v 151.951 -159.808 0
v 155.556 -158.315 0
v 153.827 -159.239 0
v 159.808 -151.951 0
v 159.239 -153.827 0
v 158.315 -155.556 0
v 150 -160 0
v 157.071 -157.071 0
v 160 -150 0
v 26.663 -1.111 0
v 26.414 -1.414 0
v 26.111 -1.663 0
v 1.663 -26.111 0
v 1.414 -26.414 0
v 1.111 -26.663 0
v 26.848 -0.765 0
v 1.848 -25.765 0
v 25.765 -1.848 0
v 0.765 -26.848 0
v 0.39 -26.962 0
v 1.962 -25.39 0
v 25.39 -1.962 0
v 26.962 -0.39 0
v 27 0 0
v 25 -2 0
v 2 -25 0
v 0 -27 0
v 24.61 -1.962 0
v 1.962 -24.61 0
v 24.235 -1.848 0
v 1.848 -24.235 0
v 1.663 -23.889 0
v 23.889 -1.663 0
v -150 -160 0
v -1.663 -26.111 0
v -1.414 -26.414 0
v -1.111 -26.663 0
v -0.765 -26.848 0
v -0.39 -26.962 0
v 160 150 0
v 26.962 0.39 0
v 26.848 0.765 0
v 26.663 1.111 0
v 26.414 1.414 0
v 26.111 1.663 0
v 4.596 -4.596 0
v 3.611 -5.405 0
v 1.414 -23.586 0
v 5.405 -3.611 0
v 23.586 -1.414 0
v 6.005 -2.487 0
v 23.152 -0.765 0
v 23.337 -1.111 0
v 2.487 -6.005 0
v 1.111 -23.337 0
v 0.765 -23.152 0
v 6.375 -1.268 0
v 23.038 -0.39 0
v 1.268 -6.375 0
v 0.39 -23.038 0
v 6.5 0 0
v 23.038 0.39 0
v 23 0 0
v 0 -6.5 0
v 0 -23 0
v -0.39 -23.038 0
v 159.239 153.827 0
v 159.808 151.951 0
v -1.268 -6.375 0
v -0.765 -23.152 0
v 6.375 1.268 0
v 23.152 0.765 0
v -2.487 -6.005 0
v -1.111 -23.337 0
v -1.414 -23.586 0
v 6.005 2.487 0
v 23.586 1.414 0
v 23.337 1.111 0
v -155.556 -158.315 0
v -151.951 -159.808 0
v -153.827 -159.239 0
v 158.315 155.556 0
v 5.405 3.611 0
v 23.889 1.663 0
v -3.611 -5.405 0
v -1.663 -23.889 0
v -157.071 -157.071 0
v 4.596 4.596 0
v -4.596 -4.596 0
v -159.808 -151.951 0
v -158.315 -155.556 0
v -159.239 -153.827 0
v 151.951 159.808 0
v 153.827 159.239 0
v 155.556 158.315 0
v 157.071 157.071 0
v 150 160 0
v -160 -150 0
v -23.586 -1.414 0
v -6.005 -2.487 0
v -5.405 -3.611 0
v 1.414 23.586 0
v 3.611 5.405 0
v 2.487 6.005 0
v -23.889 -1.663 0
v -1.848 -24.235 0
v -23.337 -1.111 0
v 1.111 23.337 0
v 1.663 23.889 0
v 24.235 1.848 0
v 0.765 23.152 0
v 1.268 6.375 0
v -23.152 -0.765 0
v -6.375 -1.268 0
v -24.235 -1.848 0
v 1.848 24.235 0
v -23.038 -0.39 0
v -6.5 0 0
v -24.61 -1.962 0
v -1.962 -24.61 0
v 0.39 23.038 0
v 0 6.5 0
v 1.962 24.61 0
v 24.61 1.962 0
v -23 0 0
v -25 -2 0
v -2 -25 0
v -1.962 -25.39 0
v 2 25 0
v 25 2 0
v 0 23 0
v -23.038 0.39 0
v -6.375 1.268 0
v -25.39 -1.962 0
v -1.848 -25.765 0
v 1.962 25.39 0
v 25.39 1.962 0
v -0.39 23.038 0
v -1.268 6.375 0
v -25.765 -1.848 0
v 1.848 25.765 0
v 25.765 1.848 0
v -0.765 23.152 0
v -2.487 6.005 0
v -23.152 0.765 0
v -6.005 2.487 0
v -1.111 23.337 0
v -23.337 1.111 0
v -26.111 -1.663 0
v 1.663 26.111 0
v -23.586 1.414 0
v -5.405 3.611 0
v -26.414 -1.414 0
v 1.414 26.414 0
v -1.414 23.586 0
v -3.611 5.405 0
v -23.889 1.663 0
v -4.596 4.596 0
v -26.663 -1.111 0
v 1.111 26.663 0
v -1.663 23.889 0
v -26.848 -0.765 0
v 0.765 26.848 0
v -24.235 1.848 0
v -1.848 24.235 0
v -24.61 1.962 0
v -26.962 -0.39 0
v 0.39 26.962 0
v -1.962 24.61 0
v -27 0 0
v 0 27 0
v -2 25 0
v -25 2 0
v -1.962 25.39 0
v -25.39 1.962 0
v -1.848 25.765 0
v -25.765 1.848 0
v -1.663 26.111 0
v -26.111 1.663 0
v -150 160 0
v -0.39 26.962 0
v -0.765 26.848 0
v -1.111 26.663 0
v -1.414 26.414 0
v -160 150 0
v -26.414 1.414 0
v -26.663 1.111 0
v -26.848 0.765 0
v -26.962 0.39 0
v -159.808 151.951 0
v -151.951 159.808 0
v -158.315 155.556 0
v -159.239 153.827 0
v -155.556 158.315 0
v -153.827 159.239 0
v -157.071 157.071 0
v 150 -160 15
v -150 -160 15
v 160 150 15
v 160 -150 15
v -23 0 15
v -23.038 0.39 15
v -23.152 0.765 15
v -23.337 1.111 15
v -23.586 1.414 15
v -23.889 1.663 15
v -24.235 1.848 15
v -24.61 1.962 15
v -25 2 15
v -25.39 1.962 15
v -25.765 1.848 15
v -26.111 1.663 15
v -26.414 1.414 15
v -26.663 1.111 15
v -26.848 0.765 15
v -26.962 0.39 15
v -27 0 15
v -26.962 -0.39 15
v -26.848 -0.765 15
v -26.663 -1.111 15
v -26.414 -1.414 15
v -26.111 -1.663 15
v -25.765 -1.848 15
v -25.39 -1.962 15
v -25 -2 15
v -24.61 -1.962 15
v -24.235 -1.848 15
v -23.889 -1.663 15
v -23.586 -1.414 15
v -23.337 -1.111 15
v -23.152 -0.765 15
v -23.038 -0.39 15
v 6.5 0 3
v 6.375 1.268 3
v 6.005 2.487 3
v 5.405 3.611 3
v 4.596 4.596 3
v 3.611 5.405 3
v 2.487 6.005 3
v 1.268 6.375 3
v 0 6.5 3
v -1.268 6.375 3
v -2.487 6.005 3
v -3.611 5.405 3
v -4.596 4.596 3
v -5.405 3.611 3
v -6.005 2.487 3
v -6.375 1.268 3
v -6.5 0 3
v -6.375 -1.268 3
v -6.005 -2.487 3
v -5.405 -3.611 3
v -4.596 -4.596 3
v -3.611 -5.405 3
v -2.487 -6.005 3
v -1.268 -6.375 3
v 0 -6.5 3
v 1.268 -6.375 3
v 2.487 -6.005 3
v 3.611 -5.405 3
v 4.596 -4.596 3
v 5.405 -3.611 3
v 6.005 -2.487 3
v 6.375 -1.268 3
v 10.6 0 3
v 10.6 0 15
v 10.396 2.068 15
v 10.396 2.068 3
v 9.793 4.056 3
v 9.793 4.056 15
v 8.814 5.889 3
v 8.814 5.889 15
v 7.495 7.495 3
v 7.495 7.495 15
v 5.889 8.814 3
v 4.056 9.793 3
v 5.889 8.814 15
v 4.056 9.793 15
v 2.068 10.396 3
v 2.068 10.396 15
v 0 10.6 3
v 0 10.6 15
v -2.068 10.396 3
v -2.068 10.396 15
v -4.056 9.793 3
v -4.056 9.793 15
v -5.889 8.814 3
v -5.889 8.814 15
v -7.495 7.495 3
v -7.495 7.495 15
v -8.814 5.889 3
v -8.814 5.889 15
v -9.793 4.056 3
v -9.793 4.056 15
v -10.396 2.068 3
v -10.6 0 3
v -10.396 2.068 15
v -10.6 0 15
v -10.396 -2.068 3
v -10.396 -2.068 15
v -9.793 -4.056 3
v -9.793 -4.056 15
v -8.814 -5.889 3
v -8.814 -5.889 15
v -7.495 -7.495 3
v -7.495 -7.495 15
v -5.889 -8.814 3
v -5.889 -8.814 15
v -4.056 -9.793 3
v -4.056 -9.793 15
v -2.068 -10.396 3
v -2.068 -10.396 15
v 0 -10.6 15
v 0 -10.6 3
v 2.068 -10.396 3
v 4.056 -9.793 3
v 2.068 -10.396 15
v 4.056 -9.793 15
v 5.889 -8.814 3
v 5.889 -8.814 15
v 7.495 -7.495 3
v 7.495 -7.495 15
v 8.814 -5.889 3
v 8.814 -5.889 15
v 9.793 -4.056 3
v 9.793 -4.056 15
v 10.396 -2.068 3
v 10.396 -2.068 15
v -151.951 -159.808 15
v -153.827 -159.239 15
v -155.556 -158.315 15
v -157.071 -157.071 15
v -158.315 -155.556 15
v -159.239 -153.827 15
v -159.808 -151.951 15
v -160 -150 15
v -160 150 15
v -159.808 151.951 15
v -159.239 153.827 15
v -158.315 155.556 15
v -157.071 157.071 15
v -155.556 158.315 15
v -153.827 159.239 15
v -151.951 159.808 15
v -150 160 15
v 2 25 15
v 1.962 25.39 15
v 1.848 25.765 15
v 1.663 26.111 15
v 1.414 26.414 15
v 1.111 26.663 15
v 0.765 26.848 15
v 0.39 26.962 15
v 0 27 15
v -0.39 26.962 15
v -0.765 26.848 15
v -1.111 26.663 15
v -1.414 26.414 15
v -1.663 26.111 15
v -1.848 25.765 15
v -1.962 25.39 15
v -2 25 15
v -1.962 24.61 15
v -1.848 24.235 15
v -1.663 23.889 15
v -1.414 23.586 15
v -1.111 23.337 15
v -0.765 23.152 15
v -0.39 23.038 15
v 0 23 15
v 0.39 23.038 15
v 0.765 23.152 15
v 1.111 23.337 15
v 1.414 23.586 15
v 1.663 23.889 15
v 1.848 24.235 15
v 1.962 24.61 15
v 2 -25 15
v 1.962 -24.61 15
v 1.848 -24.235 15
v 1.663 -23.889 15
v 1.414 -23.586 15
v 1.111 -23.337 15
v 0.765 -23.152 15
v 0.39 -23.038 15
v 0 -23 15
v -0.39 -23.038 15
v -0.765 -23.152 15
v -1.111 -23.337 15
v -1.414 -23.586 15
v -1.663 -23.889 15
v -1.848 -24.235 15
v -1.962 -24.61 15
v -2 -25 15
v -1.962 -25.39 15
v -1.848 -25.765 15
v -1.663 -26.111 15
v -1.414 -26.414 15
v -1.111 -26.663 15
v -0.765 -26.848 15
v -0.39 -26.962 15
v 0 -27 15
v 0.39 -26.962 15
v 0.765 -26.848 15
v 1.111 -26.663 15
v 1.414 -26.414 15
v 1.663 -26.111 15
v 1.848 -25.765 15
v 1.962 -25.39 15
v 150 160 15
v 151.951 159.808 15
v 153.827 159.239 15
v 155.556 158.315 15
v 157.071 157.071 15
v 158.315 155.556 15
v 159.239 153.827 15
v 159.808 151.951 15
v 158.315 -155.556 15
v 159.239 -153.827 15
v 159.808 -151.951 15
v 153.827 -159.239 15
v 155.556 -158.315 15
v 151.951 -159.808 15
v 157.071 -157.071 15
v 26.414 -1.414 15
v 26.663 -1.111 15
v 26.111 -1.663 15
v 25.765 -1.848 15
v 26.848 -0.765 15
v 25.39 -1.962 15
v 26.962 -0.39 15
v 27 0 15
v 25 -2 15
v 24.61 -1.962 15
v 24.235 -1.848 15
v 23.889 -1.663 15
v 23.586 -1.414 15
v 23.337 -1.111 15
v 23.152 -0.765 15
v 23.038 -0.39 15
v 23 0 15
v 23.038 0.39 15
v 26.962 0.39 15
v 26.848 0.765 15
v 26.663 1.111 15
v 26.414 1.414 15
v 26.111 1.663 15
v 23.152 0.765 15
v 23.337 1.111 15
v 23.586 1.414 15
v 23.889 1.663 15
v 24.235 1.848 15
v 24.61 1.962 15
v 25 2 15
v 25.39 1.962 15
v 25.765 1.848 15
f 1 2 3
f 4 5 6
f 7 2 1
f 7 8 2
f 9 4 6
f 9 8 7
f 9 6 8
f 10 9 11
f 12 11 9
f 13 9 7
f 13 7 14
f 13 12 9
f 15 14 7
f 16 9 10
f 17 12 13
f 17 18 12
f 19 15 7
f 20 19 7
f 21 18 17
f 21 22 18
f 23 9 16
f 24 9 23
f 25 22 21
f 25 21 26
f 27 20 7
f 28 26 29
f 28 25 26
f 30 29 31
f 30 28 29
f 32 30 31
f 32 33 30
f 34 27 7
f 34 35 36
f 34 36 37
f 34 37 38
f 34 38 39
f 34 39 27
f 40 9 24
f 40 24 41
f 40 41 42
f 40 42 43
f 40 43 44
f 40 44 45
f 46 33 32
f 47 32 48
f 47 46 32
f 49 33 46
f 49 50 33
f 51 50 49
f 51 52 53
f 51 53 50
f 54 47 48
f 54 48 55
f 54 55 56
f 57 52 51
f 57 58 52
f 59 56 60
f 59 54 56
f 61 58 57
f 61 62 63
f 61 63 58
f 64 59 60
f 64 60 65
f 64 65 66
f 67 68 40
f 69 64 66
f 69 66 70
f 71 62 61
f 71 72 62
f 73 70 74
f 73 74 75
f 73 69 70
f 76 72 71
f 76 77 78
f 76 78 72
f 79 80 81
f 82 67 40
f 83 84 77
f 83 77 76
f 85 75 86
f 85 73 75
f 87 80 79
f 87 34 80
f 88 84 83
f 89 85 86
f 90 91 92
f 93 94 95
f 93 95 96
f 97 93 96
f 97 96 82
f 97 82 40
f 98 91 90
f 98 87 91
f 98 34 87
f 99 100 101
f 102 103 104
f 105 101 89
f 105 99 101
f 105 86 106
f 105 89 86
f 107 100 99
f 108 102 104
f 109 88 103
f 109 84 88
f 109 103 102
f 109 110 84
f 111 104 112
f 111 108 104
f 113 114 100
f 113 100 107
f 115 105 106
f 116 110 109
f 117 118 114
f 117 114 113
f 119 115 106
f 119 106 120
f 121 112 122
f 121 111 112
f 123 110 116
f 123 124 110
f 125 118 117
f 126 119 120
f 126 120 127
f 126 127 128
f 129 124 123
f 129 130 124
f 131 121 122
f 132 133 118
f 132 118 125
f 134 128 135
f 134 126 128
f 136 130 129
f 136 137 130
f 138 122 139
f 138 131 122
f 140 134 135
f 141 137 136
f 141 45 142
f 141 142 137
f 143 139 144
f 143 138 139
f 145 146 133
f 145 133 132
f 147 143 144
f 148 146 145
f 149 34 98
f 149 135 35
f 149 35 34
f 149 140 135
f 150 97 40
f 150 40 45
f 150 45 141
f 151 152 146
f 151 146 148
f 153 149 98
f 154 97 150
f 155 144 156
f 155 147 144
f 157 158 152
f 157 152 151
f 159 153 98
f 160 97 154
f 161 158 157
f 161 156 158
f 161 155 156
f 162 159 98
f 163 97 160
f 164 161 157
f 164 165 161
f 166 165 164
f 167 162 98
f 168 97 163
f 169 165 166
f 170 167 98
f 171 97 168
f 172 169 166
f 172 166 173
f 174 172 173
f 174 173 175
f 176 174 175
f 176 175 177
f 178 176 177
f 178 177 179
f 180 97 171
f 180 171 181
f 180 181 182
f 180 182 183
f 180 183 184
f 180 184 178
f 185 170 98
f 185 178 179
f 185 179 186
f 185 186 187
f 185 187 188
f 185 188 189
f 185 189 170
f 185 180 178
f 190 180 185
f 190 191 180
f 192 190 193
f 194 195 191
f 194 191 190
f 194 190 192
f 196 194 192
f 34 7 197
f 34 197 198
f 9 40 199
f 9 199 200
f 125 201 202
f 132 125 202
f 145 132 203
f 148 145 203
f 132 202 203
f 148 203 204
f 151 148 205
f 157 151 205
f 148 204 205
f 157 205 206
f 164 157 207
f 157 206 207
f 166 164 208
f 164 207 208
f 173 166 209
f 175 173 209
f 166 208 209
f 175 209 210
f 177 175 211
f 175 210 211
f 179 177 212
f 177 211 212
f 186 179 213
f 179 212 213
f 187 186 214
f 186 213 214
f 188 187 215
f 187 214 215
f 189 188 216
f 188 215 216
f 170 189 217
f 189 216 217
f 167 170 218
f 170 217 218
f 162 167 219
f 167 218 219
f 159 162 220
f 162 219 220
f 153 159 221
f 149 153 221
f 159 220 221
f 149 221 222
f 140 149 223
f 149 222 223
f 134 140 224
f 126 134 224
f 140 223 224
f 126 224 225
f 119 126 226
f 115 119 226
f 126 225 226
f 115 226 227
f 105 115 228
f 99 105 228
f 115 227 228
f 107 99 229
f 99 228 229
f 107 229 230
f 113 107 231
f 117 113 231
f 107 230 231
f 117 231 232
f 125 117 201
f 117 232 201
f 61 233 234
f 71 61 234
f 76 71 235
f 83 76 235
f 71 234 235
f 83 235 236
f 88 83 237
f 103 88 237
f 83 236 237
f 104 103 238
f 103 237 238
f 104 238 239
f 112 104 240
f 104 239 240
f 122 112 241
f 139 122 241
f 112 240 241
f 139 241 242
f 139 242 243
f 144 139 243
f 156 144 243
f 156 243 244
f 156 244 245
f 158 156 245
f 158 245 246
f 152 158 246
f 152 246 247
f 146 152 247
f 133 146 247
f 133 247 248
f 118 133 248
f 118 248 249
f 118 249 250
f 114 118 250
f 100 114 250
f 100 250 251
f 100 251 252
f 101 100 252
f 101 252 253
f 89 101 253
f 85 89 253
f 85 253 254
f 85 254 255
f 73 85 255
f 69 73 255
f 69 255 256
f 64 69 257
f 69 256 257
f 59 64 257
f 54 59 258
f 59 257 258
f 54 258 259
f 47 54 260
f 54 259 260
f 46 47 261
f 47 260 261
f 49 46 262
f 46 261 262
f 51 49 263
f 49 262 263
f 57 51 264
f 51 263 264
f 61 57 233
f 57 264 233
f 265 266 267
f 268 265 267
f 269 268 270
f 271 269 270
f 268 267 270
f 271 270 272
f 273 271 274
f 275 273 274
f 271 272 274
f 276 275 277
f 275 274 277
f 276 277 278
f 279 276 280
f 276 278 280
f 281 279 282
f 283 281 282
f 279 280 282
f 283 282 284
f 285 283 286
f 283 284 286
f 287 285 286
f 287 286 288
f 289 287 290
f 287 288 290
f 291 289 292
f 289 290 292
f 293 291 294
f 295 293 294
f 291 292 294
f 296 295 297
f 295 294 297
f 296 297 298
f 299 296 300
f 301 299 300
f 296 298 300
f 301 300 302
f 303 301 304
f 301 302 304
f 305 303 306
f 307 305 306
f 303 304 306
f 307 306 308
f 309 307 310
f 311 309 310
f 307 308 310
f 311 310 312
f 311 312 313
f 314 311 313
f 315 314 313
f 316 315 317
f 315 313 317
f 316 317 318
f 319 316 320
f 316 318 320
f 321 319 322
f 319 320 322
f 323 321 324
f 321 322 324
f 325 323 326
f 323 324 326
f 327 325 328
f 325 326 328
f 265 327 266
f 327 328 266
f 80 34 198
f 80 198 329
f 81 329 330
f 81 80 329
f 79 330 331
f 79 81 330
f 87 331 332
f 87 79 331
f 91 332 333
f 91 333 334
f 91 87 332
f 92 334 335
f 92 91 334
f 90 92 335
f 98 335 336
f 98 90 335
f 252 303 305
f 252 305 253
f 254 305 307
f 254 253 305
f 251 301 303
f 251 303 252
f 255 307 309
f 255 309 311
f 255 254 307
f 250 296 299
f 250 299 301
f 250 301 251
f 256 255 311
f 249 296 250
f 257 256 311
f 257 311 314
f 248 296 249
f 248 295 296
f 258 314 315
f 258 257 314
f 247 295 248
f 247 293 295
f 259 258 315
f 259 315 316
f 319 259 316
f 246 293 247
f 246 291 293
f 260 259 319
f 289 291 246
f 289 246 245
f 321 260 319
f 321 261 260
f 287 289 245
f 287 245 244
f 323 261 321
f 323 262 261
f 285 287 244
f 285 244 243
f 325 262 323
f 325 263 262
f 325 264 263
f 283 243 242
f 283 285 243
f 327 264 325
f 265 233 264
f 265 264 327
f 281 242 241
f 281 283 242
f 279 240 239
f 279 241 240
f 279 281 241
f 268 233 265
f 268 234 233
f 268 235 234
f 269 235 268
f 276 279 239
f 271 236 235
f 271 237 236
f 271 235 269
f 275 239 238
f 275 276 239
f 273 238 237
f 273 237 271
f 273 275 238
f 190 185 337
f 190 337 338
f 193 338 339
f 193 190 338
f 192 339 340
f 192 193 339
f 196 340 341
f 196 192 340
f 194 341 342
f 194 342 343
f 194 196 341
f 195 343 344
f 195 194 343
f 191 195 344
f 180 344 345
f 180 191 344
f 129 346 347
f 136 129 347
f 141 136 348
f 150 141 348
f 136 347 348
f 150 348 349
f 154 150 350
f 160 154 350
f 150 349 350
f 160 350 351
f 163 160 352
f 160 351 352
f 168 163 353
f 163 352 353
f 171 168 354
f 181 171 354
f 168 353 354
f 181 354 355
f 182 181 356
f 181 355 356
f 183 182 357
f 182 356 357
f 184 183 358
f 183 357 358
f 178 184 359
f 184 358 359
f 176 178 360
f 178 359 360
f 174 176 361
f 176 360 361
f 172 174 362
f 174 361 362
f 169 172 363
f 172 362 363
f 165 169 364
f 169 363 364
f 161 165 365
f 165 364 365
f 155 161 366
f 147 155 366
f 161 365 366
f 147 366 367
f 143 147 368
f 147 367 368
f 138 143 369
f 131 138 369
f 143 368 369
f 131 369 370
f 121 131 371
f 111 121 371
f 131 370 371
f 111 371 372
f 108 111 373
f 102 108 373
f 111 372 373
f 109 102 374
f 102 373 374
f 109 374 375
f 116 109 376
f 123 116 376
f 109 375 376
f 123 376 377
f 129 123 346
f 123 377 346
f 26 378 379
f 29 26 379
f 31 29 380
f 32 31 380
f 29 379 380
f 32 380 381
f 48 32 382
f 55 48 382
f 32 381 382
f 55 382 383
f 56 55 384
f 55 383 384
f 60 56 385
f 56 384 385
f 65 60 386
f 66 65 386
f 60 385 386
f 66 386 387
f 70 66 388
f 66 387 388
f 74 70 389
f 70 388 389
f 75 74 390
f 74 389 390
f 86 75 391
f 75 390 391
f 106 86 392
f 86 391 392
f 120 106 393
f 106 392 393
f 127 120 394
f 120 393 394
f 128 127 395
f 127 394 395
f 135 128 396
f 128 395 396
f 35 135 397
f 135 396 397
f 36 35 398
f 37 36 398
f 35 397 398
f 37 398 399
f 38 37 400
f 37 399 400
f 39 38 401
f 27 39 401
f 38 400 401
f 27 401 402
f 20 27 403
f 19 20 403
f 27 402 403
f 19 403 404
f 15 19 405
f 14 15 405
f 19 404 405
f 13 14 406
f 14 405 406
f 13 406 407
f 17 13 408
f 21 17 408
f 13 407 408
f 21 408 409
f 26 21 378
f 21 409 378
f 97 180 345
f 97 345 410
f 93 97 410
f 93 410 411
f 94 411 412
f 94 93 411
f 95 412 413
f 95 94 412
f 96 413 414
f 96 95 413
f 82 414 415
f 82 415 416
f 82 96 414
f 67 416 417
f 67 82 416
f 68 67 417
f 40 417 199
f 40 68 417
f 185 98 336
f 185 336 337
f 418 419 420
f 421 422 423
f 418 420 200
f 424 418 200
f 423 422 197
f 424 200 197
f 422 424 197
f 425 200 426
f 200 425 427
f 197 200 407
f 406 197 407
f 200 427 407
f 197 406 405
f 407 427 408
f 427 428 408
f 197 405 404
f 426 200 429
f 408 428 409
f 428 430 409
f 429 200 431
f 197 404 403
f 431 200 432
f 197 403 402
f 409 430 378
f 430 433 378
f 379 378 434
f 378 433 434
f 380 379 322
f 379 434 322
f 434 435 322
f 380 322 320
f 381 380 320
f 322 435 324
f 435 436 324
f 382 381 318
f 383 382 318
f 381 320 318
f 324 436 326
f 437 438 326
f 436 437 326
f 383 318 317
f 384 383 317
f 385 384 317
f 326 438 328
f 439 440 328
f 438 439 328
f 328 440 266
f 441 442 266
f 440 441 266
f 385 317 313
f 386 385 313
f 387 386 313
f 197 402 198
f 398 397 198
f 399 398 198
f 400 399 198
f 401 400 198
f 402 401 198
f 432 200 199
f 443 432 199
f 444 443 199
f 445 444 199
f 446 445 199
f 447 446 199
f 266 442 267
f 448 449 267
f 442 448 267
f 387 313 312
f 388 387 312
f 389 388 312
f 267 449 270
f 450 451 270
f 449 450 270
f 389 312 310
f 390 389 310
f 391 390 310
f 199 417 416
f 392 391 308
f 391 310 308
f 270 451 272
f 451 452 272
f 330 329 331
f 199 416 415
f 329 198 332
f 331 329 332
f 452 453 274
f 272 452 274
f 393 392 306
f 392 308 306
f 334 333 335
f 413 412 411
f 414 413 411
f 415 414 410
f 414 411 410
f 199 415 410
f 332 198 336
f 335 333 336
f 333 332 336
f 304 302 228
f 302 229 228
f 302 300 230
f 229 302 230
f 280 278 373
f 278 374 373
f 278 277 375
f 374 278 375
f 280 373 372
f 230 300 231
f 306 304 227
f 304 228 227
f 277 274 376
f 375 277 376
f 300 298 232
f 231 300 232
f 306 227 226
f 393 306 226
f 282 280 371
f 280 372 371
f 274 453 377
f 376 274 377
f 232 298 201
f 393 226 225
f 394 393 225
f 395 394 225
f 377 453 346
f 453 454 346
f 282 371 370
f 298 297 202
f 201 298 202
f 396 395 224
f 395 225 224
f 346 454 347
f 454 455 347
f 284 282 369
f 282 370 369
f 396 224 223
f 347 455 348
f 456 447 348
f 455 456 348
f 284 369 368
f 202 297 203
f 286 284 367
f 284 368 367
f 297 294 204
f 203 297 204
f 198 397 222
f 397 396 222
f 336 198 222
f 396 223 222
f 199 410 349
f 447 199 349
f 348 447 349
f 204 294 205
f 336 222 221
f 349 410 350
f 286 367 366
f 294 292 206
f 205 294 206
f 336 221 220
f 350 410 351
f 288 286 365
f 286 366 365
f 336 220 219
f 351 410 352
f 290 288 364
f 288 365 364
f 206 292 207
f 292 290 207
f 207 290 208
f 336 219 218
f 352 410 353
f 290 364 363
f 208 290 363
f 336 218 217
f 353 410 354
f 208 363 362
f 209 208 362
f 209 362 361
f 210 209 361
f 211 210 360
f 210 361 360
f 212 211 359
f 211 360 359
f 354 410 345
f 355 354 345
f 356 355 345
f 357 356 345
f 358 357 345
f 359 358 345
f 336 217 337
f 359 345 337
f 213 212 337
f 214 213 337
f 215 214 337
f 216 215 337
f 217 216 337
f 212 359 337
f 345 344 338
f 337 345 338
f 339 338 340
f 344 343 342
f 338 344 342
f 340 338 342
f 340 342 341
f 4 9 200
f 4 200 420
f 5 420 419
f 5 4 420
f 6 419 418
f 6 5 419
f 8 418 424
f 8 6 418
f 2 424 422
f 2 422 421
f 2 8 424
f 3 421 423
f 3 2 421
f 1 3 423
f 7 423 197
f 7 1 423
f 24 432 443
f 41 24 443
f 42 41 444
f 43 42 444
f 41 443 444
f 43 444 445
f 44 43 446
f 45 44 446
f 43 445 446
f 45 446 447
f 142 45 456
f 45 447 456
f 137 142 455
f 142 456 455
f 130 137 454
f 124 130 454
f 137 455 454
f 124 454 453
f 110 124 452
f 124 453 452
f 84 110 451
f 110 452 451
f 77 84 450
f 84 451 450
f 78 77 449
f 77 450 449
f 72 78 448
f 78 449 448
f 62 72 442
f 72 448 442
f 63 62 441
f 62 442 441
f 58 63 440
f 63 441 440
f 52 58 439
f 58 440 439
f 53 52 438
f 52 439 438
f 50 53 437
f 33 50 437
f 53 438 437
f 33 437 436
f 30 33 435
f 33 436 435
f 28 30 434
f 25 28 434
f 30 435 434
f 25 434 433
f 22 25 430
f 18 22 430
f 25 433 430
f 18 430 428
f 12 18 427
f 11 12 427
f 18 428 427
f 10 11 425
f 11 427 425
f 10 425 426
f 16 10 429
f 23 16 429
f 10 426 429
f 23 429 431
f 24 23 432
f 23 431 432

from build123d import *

# Parameters (mm, degrees)
BOSS_EXTRUDE1_DEPTH = 15
SKETCH2_R           = 10.6
CUT_EXTRUDE1_DEPTH  = 12
SKETCH3_R           = 6.5
CUT_EXTRUDE2_DEPTH  = 10
SKETCH4_R           = 2
CUT_EXTRUDE3_DEPTH  = 15


with BuildPart() as part:
    # Sketch1 → Boss-Extrude1 (new body)
    with BuildSketch(Plane.XY):
        with BuildLine():
            Line((-150, 160), (150, 160))
            ThreePointArc((150, 160), (157.071067812, 157.071067812), (160, 150))
            Line((160, 150), (160, -150))
            ThreePointArc((160, -150), (157.071067812, -157.071067812), (150, -160))
            Line((150, -160), (-150, -160))
            ThreePointArc((-150, -160), (-157.071067812, -157.071067812), (-160, -150))
            Line((-160, -150), (-160, 150))
            ThreePointArc((-160, 150), (-157.071067812, 157.071067812), (-150, 160))
        make_face()
    extrude(amount=BOSS_EXTRUDE1_DEPTH)

    # Sketch2 → Cut-Extrude1 (cut)
    with BuildSketch(Plane.XY.offset(15)):
        Circle(SKETCH2_R)
    extrude(amount=-CUT_EXTRUDE1_DEPTH, mode=Mode.SUBTRACT)

    # Sketch3 → Cut-Extrude2 (cut)
    with BuildSketch(Plane.XY.offset(3)):
        Circle(SKETCH3_R)
    extrude(amount=-CUT_EXTRUDE2_DEPTH, mode=Mode.SUBTRACT)

    # Sketch4 → Cut-Extrude3 (cut)
    with BuildSketch(Plane.XY.offset(15)):
        with Locations((0, 25)):
            Circle(SKETCH4_R)
        with Locations((25, 0)):
            Circle(SKETCH4_R)
        with Locations((0, -25)):
            Circle(SKETCH4_R)
        with Locations((-25, 0)):
            Circle(SKETCH4_R)
    extrude(amount=-CUT_EXTRUDE3_DEPTH, mode=Mode.SUBTRACT)


solid = part.part
